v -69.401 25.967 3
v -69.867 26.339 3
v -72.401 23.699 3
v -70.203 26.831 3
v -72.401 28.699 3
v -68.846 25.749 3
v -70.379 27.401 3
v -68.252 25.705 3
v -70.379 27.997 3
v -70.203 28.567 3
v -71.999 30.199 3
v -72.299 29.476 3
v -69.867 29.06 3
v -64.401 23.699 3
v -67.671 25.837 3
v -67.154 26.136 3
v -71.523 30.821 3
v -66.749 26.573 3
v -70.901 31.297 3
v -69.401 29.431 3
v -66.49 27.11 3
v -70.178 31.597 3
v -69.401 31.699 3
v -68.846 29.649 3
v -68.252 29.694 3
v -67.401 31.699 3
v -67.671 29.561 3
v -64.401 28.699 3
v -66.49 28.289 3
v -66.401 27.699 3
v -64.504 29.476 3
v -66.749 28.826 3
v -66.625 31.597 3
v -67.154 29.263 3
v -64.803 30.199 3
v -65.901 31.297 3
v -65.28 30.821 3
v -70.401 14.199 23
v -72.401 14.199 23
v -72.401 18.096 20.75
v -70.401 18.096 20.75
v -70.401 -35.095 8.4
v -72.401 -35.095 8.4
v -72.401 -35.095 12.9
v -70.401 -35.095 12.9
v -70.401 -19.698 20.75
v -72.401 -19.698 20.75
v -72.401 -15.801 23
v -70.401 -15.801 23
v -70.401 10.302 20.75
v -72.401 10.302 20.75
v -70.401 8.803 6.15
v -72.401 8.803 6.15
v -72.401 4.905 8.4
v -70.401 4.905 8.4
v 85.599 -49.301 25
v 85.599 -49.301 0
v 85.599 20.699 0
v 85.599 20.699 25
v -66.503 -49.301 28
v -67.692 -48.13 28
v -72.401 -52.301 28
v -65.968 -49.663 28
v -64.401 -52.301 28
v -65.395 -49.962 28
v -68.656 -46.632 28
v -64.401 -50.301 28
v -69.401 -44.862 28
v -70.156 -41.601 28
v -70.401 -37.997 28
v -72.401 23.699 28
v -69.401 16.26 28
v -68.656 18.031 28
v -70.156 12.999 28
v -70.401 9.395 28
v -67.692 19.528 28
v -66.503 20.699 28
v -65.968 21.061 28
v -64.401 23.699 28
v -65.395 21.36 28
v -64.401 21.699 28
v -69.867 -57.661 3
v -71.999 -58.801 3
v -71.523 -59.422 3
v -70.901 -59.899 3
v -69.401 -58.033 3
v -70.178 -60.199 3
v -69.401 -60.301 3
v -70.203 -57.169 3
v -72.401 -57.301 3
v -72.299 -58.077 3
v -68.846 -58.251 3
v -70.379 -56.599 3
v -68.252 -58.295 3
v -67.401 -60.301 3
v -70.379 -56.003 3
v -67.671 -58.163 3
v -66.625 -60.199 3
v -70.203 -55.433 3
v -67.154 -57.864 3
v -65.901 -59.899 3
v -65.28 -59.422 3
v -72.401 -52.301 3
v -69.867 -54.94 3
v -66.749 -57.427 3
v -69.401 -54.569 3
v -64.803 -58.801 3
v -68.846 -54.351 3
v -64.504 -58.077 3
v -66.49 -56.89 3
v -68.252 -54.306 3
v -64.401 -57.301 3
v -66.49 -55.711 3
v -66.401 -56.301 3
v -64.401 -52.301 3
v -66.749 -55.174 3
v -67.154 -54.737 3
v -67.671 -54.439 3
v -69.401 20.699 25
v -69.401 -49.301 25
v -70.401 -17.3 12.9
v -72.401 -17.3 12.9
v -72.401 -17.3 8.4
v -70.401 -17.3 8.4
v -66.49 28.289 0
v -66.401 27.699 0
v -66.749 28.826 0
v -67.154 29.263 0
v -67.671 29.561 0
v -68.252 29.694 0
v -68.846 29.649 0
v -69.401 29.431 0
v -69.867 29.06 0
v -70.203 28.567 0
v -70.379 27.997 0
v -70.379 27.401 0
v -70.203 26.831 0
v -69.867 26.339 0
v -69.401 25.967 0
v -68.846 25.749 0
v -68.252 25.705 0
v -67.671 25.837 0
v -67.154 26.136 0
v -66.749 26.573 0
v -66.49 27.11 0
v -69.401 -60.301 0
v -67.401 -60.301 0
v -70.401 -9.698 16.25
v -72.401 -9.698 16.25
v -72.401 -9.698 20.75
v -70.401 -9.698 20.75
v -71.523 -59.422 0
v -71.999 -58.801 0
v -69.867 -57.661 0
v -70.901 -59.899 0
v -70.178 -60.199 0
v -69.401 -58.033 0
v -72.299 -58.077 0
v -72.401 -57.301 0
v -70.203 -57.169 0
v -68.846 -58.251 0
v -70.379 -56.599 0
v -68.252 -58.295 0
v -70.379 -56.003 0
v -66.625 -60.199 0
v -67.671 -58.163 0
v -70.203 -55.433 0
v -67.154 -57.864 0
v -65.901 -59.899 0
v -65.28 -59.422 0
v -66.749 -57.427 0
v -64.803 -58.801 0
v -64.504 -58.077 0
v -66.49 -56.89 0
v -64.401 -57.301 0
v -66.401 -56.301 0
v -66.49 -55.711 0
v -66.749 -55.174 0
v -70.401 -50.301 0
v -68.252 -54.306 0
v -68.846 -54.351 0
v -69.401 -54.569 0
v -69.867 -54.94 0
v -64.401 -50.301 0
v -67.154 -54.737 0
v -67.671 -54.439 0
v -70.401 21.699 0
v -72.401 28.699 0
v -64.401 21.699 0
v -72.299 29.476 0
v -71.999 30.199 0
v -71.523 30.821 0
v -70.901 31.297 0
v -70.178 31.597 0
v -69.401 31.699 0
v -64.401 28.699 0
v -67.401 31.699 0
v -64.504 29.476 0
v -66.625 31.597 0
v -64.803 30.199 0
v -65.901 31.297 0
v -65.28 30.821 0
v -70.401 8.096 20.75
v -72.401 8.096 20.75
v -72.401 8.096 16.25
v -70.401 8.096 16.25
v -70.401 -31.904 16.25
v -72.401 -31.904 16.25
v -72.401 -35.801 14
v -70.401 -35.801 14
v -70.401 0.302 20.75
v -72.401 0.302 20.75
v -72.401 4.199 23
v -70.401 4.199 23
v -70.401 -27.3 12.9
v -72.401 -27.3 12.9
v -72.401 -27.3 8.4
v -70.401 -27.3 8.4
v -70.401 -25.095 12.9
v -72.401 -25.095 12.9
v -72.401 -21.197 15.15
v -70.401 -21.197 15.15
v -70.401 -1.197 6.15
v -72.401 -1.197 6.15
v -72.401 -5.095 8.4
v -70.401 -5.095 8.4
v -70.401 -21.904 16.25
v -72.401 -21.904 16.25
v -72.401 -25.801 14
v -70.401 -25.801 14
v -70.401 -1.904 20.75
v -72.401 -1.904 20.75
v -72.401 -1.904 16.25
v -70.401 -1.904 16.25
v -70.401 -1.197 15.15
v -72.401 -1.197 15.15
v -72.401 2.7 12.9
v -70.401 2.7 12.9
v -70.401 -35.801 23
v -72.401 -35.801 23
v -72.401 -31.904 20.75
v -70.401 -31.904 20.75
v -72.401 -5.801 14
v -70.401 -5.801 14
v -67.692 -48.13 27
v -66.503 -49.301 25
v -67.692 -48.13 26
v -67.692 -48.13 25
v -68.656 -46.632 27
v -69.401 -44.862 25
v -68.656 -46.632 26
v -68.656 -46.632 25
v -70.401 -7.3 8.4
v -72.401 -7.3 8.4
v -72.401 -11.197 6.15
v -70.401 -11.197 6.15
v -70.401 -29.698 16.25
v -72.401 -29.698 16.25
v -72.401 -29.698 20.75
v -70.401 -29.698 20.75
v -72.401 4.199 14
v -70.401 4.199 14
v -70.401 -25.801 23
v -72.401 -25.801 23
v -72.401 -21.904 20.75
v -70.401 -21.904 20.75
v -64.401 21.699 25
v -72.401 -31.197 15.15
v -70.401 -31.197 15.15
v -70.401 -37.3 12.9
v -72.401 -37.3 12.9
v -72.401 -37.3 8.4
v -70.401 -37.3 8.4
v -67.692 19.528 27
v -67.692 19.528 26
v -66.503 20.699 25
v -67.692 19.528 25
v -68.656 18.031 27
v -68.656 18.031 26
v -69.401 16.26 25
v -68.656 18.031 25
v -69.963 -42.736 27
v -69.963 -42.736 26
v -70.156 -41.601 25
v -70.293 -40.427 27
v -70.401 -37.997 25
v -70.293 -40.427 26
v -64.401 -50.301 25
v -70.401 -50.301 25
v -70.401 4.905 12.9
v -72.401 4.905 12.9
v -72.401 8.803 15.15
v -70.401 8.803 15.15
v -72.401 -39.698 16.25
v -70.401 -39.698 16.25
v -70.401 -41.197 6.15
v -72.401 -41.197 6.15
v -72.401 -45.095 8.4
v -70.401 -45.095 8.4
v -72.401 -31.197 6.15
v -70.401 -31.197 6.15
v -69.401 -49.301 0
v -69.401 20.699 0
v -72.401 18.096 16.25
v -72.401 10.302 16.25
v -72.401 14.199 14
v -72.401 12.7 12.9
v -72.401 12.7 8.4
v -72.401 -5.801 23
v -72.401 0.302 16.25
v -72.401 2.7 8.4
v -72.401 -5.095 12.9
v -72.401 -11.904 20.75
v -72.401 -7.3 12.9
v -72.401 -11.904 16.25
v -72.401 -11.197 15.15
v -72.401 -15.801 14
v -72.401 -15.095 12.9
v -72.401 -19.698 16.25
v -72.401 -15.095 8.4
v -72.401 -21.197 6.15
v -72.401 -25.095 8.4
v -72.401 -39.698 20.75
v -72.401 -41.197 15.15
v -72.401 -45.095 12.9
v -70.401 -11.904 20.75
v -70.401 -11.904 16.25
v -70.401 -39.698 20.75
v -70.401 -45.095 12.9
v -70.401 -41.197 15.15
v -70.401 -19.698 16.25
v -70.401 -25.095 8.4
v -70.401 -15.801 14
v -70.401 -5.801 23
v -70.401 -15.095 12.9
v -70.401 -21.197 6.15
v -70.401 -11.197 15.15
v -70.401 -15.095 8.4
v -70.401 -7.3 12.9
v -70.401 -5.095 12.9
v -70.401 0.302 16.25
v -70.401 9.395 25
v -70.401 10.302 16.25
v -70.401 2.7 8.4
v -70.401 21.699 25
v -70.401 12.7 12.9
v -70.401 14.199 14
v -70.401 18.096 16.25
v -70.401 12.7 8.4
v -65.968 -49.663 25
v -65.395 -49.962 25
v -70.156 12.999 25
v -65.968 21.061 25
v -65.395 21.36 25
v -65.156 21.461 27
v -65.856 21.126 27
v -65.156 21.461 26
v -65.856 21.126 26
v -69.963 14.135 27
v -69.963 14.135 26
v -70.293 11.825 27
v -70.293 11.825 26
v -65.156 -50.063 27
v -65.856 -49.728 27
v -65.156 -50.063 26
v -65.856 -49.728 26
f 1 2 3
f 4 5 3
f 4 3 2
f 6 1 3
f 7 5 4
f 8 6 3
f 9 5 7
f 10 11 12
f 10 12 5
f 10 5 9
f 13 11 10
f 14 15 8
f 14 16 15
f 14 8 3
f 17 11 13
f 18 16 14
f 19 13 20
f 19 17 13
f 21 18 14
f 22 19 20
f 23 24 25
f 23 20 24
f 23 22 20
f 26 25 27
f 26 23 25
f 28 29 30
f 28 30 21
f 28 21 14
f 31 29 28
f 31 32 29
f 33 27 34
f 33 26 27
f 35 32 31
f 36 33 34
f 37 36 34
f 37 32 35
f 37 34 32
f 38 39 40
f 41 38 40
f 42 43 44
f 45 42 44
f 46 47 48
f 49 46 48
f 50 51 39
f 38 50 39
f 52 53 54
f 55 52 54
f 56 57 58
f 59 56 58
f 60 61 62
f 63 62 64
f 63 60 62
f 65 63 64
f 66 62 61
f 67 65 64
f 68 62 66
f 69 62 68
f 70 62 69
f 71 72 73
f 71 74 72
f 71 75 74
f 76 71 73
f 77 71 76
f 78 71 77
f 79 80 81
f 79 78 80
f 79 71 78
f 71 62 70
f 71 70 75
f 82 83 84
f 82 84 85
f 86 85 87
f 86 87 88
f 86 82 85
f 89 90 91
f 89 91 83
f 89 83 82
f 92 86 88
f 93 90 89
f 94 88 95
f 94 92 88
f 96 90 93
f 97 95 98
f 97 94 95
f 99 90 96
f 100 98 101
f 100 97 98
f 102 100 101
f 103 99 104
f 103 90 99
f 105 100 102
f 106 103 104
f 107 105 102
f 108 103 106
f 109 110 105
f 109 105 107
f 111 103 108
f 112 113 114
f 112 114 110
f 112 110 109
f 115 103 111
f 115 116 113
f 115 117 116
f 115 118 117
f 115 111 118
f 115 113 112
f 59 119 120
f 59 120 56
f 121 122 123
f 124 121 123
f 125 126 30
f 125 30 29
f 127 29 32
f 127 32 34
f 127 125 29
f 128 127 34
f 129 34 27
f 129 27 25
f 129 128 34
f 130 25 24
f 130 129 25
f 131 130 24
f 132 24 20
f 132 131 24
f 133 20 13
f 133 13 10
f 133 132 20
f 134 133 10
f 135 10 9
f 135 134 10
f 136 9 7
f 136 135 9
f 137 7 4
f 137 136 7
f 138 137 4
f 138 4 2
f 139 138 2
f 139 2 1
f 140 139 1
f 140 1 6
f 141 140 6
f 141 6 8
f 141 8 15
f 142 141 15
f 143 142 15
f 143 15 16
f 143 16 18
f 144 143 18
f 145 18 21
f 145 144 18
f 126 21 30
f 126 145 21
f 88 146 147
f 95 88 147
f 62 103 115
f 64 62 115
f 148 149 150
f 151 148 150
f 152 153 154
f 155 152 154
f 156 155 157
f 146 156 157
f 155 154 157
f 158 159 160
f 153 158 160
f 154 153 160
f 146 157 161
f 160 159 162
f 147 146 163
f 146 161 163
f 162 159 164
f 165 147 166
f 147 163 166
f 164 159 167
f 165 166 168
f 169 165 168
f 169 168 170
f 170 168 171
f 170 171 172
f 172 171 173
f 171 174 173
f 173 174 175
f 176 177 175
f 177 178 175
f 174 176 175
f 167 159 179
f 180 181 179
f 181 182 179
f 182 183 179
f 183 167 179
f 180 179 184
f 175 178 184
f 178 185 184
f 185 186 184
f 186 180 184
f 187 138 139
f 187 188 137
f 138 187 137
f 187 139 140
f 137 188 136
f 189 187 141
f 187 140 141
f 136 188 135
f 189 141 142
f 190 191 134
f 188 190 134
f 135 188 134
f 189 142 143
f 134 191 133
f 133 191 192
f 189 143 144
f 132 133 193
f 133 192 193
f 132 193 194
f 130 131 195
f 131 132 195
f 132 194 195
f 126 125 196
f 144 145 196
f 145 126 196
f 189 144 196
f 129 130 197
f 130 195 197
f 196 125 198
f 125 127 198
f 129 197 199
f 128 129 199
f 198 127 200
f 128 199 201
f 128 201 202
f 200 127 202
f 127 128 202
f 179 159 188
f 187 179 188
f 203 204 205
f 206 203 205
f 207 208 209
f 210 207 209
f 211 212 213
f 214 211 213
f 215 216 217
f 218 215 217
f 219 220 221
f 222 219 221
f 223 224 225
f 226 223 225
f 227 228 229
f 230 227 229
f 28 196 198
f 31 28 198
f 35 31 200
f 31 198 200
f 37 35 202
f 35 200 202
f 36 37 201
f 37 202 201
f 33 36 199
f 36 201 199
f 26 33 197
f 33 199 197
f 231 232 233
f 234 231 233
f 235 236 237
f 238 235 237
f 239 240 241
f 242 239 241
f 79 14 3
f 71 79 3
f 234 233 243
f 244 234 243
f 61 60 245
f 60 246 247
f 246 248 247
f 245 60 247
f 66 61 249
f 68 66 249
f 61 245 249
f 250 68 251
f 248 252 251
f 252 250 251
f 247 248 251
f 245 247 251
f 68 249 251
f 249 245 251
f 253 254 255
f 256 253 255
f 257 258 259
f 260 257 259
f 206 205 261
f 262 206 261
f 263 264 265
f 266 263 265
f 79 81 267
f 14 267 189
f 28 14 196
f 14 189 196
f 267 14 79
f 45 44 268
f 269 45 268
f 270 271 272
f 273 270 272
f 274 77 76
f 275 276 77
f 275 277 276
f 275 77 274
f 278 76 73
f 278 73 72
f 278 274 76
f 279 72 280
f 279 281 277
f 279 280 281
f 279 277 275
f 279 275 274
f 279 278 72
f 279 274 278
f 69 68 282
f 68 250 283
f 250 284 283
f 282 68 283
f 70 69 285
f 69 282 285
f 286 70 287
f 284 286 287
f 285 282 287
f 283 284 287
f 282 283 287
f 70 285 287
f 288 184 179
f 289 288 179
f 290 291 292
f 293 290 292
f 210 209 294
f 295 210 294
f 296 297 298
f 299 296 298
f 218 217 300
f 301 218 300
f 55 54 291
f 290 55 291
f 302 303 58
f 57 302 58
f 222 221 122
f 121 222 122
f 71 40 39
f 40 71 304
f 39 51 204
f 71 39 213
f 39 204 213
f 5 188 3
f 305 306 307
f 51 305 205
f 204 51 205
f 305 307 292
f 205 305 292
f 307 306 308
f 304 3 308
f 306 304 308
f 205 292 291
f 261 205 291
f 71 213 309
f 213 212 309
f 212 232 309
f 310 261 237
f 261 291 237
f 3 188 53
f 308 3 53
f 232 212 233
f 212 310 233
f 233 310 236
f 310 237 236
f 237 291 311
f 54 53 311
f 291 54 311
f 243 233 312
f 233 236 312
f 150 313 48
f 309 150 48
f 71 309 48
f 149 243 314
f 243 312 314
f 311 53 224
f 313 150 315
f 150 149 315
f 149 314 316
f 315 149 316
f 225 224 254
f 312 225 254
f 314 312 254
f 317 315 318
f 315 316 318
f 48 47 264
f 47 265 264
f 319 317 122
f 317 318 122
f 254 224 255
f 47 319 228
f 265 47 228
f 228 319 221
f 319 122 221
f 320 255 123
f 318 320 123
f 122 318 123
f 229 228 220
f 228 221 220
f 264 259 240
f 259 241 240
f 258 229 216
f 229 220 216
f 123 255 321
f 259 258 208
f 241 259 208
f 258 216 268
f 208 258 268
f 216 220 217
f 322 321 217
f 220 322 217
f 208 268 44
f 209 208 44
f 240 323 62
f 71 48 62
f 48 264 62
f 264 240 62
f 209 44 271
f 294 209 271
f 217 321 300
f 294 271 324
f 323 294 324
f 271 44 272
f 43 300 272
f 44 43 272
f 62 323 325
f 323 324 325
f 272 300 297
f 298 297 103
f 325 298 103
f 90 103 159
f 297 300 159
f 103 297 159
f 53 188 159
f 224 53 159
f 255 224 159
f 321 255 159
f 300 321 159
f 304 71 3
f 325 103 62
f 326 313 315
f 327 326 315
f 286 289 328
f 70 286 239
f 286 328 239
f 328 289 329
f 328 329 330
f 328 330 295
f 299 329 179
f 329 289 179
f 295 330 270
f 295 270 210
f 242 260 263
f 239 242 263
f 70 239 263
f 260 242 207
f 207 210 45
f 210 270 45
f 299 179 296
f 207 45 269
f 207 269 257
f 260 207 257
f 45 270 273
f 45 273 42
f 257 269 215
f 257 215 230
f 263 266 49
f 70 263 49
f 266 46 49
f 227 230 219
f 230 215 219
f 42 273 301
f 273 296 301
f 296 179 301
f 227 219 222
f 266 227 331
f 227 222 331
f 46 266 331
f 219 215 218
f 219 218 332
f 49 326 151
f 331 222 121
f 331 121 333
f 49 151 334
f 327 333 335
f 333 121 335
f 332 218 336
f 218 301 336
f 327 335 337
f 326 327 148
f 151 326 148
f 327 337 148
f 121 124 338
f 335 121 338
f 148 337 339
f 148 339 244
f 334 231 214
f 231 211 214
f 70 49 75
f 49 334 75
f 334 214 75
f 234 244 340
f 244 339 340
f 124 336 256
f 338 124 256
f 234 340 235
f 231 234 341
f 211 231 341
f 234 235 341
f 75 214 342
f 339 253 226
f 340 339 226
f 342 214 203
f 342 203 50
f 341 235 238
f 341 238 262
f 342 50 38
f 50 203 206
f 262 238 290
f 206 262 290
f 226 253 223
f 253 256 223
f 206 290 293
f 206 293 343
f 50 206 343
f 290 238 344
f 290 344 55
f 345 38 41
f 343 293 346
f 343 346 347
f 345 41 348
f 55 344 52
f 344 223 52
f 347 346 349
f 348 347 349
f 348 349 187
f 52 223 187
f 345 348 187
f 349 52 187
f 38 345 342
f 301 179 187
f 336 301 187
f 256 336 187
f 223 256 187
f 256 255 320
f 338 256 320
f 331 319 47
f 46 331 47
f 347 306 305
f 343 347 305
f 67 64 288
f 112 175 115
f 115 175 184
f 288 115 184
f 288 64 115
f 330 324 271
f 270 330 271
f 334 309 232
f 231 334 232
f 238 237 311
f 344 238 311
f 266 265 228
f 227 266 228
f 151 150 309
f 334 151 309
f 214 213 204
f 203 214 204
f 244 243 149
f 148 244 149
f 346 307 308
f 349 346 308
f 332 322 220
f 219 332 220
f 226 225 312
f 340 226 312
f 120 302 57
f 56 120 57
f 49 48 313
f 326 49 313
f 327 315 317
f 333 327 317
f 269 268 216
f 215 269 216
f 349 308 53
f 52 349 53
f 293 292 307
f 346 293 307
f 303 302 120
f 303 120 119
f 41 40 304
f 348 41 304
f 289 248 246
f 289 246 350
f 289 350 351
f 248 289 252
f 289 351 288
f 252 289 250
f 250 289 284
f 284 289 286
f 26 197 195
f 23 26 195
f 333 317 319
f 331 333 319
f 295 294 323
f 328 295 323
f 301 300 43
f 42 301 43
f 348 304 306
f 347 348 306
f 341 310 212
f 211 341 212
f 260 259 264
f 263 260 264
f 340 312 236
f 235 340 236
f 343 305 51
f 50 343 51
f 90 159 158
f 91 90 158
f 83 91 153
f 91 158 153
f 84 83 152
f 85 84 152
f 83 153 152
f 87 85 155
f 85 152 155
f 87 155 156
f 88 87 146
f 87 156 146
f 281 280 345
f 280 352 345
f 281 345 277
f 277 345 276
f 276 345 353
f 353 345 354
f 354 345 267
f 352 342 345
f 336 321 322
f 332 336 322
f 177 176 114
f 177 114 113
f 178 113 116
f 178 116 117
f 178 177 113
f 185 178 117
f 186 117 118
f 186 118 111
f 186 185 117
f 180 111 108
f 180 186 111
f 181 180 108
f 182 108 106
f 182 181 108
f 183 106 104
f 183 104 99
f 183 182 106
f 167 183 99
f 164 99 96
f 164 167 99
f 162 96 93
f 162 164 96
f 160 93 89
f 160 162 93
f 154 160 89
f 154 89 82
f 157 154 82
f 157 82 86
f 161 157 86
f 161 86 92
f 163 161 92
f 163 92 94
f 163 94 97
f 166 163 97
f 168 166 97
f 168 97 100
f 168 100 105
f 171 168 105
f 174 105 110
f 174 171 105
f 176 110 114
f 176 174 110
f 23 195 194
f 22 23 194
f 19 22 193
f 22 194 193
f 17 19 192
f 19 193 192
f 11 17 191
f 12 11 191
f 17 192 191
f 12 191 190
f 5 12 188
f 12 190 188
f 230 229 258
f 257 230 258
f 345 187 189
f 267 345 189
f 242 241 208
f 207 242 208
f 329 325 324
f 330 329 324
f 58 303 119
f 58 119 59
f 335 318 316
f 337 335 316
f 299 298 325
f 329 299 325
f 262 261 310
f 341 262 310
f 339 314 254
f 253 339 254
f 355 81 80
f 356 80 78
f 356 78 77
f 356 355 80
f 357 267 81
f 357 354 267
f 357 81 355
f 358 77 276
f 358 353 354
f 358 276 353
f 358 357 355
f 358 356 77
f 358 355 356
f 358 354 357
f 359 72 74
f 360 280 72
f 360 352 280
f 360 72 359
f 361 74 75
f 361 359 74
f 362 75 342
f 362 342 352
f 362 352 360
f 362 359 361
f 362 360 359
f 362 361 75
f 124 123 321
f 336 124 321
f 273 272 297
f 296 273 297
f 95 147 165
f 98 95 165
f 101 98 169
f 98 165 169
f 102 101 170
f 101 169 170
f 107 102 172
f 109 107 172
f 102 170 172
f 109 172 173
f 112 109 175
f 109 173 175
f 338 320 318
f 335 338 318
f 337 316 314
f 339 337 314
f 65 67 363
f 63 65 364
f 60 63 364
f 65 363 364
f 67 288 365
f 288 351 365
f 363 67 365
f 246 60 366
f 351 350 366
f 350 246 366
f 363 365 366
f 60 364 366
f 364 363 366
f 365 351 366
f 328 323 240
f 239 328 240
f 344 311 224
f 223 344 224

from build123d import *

# Parameters (mm, degrees)
F0_W     = 155
F0_H     = 70
F1_DEPTH = 25
F2_R     = 2
F3_DEPTH = 3
F4_DEPTH = 28
F5_START = 25
F5_DEPTH = 3
F7_DEPTH = 25


# Not quite as in the source:
# - a feature names something its author has since deleted; it is built from what else it names


with BuildPart() as f1:
    # F0 (on Top) → F1 (new body)
    with BuildSketch(Plane.XY):
        with Locations((8.0986786634, -14.300759537)):
            Rectangle(F0_W, F0_H)
    extrude(amount=F1_DEPTH)


with BuildPart() as f3:
    # F2 (on Top) → F3 (new body)
    with BuildSketch(Plane.XY):
        with BuildLine():
            Line((-72.4013213366, 23.699240463), (-64.4013213366, 23.699240463))
            Line((-64.4013213366, 23.699240463), (-64.4013213366, 28.699240463))
            ThreePointArc((-64.4013213366, 28.699240463), (-65.2800009931, 30.8205608065), (-67.4013213366, 31.699240463))
            Line((-67.4013213366, 31.699240463), (-69.4013213366, 31.699240463))
            ThreePointArc((-69.4013213366, 31.699240463), (-71.5226416802, 30.8205608065), (-72.4013213366, 28.699240463))
            Line((-72.4013213366, 28.699240463), (-72.4013213366, 23.699240463))
        make_face()
        with Locations((-68.4013213366, 27.699240463)):
            Circle(F2_R, mode=Mode.SUBTRACT)
        Polygon((-70.4013213366, -14.300759537), (-70.4013213366, 9.3950822393), (-70.4013213366, 21.699240463), (-64.4013213366, 21.699240463), (-64.4013213366, 23.699240463), (-72.4013213366, 23.699240463), (-72.4013213366, -14.300759537), align=None)
        Polygon((-70.4013213366, -50.300759537), (-70.4013213366, -37.9966013134), (-70.4013213366, -14.300759537), (-72.4013213366, -14.300759537), (-72.4013213366, -52.300759537), (-64.4013213366, -52.300759537), (-64.4013213366, -50.300759537), align=None)
        with BuildLine():
            Line((-64.4013213366, -57.300759537), (-64.4013213366, -52.300759537))
            Line((-64.4013213366, -52.300759537), (-72.4013213366, -52.300759537))
            Line((-72.4013213366, -52.300759537), (-72.4013213366, -57.300759537))
            ThreePointArc((-72.4013213366, -57.300759537), (-71.5226416802, -59.4220798806), (-69.4013213366, -60.300759537))
            Line((-69.4013213366, -60.300759537), (-67.4013213366, -60.300759537))
            ThreePointArc((-67.4013213366, -60.300759537), (-65.2800009931, -59.4220798806), (-64.4013213366, -57.300759537))
        make_face()
        with Locations((-68.4013213366, -56.300759537)):
            Circle(F2_R, mode=Mode.SUBTRACT)
    extrude(amount=F3_DEPTH)

    # F2 (on Top) → F4 (join, through all)
    with BuildSketch(Plane.XY):
        Polygon((-70.4013213366, -50.300759537), (-70.4013213366, -37.9966013134), (-70.4013213366, -14.300759537), (-72.4013213366, -14.300759537), (-72.4013213366, -52.300759537), (-64.4013213366, -52.300759537), (-64.4013213366, -50.300759537), align=None)
        Polygon((-70.4013213366, -14.300759537), (-70.4013213366, 9.3950822393), (-70.4013213366, 21.699240463), (-64.4013213366, 21.699240463), (-64.4013213366, 23.699240463), (-72.4013213366, 23.699240463), (-72.4013213366, -14.300759537), align=None)
    extrude(amount=F4_DEPTH)

    # F2 (on Top) → F5 (join)
    with BuildSketch(Plane.XY.offset(F5_START)):
        with BuildLine():
            Line((-66.5030320211, 20.699240463), (-69.4013213366, 20.699240463))
            Line((-69.4013213366, 20.699240463), (-69.4013213366, 16.260107167))
            add(Edge.make_bspline(
                [(-66.5030320211, 20.699240463), (-67.8075846929, 19.7092528514), (-68.7629395105, 18.1494653893), (-69.4013213366, 16.260107167)],
                knots=[2.5629502301, 2.5629502301, 2.5629502301, 2.5629502301, 7.9519487063, 7.9519487063, 7.9519487063, 7.9519487063], degree=3))
        make_face()
        with BuildLine():
            Line((-69.4013213366, 16.260107167), (-69.4013213366, 20.699240463))
            Line((-69.4013213366, 20.699240463), (-66.5030320211, 20.699240463))
            add(Edge.make_bspline(
                [(-64.4013213366, 21.699240463), (-65.1831859383, 21.5120152683), (-65.8826006765, 21.1700680181), (-66.5030320211, 20.699240463)],
                knots=[0, 0, 0, 0, 2.5629502301, 2.5629502301, 2.5629502301, 2.5629502301], degree=3))
            Line((-64.4013213366, 21.699240463), (-70.4013213366, 21.699240463))
            Line((-70.4013213366, 21.699240463), (-70.4013213366, 9.3950822393))
            add(Edge.make_bspline(
                [(-69.4013213366, 16.260107167), (-70.0809490956, 14.2486772642), (-70.4013213366, 11.8637135989), (-70.4013213366, 9.3950822393)],
                knots=[7.9519487063, 7.9519487063, 7.9519487063, 7.9519487063, 13.6891310752, 13.6891310752, 13.6891310752, 13.6891310752], degree=3))
        make_face()
        with BuildLine():
            add(Edge.make_bspline(
                [(-66.5030320211, -49.300759537), (-67.8075846929, -48.3107719254), (-68.7629395105, -46.7509844633), (-69.4013213366, -44.861626241)],
                knots=[2.5629502301, 2.5629502301, 2.5629502301, 2.5629502301, 7.9519487063, 7.9519487063, 7.9519487063, 7.9519487063], degree=3))
            Line((-69.4013213366, -44.861626241), (-69.4013213366, -49.300759537))
            Line((-69.4013213366, -49.300759537), (-66.5030320211, -49.300759537))
        make_face()
        with BuildLine():
            Line((-69.4013213366, -49.300759537), (-69.4013213366, -44.861626241))
            add(Edge.make_bspline(
                [(-69.4013213366, -44.861626241), (-70.0809490956, -42.8501963382), (-70.4013213366, -40.4652326729), (-70.4013213366, -37.9966013134)],
                knots=[7.9519487063, 7.9519487063, 7.9519487063, 7.9519487063, 13.6891310752, 13.6891310752, 13.6891310752, 13.6891310752], degree=3))
            Line((-70.4013213366, -37.9966013134), (-70.4013213366, -50.300759537))
            Line((-70.4013213366, -50.300759537), (-64.4013213366, -50.300759537))
            add(Edge.make_bspline(
                [(-64.4013213366, -50.300759537), (-65.1831859383, -50.1135343424), (-65.8826006765, -49.7715870921), (-66.5030320211, -49.300759537)],
                knots=[0, 0, 0, 0, 2.5629502301, 2.5629502301, 2.5629502301, 2.5629502301], degree=3))
            Line((-66.5030320211, -49.300759537), (-69.4013213366, -49.300759537))
        make_face()
    extrude(amount=F5_DEPTH)

    # F6 (on face) → F7 (cut)
    with BuildSketch(Plane(origin=(-72.4013213366, 0, 0), x_dir=(0, -1, 0), z_dir=(-1, 0, 0))):
        Polygon((-18.09635478, 16.25), (-14.199240463, 14), (-10.302126146, 16.25), (-10.302126146, 20.75), (-14.199240463, 23), (-18.09635478, 20.75), align=None)
        Polygon((-4.199240463, 23), (-8.09635478, 20.75), (-8.09635478, 16.25), (-4.199240463, 14), (-0.302126146, 16.25), (-0.302126146, 20.75), align=None)
        Polygon((5.800759537, 23), (1.90364522, 20.75), (1.90364522, 16.25), (5.800759537, 14), (9.697873854, 16.25), (9.697873854, 20.75), align=None)
        Polygon((15.800759537, 23), (11.90364522, 20.75), (11.90364522, 16.25), (15.800759537, 14), (19.697873854, 16.25), (19.697873854, 20.75), align=None)
        Polygon((25.800759537, 23), (21.90364522, 20.75), (21.90364522, 16.25), (25.800759537, 14), (29.697873854, 16.25), (29.697873854, 20.75), align=None)
        Polygon((35.800759537, 23), (31.90364522, 20.75), (31.90364522, 16.25), (35.800759537, 14), (39.697873854, 16.25), (39.697873854, 20.75), align=None)
        Polygon((37.3003223389, 8.3999978378), (41.197436656, 6.1499978378), (45.094550973, 8.3999978378), (45.094550973, 12.8999978378), (41.197436656, 15.1499978378), (37.3003223389, 12.8999978378), align=None)
        Polygon((27.3003223389, 8.3999978378), (31.197436656, 6.1499978378), (35.094550973, 8.3999978378), (35.094550973, 12.8999978378), (31.197436656, 15.1499978378), (27.3003223389, 12.8999978378), align=None)
        Polygon((17.3003223389, 8.3999978378), (21.197436656, 6.1499978378), (25.094550973, 8.3999978378), (25.094550973, 12.8999978378), (21.197436656, 15.1499978378), (17.3003223389, 12.8999978378), align=None)
        Polygon((7.3003223389, 8.3999978378), (11.197436656, 6.1499978378), (15.094550973, 8.3999978378), (15.094550973, 12.8999978378), (11.197436656, 15.1499978378), (7.3003223389, 12.8999978378), align=None)
        Polygon((-2.6996776611, 8.3999978378), (1.197436656, 6.1499978378), (5.094550973, 8.3999978378), (5.094550973, 12.8999978378), (1.197436656, 15.1499978378), (-2.6996776611, 12.8999978378), align=None)
        Polygon((-8.802563344, 15.1499978378), (-12.6996776611, 12.8999978378), (-12.6996776611, 8.3999978378), (-8.802563344, 6.1499978378), (-4.905449027, 8.3999978378), (-4.905449027, 12.8999978378), align=None)
    extrude(amount=-F7_DEPTH, mode=Mode.SUBTRACT)


solid = Compound([f1.part, f3.part])
